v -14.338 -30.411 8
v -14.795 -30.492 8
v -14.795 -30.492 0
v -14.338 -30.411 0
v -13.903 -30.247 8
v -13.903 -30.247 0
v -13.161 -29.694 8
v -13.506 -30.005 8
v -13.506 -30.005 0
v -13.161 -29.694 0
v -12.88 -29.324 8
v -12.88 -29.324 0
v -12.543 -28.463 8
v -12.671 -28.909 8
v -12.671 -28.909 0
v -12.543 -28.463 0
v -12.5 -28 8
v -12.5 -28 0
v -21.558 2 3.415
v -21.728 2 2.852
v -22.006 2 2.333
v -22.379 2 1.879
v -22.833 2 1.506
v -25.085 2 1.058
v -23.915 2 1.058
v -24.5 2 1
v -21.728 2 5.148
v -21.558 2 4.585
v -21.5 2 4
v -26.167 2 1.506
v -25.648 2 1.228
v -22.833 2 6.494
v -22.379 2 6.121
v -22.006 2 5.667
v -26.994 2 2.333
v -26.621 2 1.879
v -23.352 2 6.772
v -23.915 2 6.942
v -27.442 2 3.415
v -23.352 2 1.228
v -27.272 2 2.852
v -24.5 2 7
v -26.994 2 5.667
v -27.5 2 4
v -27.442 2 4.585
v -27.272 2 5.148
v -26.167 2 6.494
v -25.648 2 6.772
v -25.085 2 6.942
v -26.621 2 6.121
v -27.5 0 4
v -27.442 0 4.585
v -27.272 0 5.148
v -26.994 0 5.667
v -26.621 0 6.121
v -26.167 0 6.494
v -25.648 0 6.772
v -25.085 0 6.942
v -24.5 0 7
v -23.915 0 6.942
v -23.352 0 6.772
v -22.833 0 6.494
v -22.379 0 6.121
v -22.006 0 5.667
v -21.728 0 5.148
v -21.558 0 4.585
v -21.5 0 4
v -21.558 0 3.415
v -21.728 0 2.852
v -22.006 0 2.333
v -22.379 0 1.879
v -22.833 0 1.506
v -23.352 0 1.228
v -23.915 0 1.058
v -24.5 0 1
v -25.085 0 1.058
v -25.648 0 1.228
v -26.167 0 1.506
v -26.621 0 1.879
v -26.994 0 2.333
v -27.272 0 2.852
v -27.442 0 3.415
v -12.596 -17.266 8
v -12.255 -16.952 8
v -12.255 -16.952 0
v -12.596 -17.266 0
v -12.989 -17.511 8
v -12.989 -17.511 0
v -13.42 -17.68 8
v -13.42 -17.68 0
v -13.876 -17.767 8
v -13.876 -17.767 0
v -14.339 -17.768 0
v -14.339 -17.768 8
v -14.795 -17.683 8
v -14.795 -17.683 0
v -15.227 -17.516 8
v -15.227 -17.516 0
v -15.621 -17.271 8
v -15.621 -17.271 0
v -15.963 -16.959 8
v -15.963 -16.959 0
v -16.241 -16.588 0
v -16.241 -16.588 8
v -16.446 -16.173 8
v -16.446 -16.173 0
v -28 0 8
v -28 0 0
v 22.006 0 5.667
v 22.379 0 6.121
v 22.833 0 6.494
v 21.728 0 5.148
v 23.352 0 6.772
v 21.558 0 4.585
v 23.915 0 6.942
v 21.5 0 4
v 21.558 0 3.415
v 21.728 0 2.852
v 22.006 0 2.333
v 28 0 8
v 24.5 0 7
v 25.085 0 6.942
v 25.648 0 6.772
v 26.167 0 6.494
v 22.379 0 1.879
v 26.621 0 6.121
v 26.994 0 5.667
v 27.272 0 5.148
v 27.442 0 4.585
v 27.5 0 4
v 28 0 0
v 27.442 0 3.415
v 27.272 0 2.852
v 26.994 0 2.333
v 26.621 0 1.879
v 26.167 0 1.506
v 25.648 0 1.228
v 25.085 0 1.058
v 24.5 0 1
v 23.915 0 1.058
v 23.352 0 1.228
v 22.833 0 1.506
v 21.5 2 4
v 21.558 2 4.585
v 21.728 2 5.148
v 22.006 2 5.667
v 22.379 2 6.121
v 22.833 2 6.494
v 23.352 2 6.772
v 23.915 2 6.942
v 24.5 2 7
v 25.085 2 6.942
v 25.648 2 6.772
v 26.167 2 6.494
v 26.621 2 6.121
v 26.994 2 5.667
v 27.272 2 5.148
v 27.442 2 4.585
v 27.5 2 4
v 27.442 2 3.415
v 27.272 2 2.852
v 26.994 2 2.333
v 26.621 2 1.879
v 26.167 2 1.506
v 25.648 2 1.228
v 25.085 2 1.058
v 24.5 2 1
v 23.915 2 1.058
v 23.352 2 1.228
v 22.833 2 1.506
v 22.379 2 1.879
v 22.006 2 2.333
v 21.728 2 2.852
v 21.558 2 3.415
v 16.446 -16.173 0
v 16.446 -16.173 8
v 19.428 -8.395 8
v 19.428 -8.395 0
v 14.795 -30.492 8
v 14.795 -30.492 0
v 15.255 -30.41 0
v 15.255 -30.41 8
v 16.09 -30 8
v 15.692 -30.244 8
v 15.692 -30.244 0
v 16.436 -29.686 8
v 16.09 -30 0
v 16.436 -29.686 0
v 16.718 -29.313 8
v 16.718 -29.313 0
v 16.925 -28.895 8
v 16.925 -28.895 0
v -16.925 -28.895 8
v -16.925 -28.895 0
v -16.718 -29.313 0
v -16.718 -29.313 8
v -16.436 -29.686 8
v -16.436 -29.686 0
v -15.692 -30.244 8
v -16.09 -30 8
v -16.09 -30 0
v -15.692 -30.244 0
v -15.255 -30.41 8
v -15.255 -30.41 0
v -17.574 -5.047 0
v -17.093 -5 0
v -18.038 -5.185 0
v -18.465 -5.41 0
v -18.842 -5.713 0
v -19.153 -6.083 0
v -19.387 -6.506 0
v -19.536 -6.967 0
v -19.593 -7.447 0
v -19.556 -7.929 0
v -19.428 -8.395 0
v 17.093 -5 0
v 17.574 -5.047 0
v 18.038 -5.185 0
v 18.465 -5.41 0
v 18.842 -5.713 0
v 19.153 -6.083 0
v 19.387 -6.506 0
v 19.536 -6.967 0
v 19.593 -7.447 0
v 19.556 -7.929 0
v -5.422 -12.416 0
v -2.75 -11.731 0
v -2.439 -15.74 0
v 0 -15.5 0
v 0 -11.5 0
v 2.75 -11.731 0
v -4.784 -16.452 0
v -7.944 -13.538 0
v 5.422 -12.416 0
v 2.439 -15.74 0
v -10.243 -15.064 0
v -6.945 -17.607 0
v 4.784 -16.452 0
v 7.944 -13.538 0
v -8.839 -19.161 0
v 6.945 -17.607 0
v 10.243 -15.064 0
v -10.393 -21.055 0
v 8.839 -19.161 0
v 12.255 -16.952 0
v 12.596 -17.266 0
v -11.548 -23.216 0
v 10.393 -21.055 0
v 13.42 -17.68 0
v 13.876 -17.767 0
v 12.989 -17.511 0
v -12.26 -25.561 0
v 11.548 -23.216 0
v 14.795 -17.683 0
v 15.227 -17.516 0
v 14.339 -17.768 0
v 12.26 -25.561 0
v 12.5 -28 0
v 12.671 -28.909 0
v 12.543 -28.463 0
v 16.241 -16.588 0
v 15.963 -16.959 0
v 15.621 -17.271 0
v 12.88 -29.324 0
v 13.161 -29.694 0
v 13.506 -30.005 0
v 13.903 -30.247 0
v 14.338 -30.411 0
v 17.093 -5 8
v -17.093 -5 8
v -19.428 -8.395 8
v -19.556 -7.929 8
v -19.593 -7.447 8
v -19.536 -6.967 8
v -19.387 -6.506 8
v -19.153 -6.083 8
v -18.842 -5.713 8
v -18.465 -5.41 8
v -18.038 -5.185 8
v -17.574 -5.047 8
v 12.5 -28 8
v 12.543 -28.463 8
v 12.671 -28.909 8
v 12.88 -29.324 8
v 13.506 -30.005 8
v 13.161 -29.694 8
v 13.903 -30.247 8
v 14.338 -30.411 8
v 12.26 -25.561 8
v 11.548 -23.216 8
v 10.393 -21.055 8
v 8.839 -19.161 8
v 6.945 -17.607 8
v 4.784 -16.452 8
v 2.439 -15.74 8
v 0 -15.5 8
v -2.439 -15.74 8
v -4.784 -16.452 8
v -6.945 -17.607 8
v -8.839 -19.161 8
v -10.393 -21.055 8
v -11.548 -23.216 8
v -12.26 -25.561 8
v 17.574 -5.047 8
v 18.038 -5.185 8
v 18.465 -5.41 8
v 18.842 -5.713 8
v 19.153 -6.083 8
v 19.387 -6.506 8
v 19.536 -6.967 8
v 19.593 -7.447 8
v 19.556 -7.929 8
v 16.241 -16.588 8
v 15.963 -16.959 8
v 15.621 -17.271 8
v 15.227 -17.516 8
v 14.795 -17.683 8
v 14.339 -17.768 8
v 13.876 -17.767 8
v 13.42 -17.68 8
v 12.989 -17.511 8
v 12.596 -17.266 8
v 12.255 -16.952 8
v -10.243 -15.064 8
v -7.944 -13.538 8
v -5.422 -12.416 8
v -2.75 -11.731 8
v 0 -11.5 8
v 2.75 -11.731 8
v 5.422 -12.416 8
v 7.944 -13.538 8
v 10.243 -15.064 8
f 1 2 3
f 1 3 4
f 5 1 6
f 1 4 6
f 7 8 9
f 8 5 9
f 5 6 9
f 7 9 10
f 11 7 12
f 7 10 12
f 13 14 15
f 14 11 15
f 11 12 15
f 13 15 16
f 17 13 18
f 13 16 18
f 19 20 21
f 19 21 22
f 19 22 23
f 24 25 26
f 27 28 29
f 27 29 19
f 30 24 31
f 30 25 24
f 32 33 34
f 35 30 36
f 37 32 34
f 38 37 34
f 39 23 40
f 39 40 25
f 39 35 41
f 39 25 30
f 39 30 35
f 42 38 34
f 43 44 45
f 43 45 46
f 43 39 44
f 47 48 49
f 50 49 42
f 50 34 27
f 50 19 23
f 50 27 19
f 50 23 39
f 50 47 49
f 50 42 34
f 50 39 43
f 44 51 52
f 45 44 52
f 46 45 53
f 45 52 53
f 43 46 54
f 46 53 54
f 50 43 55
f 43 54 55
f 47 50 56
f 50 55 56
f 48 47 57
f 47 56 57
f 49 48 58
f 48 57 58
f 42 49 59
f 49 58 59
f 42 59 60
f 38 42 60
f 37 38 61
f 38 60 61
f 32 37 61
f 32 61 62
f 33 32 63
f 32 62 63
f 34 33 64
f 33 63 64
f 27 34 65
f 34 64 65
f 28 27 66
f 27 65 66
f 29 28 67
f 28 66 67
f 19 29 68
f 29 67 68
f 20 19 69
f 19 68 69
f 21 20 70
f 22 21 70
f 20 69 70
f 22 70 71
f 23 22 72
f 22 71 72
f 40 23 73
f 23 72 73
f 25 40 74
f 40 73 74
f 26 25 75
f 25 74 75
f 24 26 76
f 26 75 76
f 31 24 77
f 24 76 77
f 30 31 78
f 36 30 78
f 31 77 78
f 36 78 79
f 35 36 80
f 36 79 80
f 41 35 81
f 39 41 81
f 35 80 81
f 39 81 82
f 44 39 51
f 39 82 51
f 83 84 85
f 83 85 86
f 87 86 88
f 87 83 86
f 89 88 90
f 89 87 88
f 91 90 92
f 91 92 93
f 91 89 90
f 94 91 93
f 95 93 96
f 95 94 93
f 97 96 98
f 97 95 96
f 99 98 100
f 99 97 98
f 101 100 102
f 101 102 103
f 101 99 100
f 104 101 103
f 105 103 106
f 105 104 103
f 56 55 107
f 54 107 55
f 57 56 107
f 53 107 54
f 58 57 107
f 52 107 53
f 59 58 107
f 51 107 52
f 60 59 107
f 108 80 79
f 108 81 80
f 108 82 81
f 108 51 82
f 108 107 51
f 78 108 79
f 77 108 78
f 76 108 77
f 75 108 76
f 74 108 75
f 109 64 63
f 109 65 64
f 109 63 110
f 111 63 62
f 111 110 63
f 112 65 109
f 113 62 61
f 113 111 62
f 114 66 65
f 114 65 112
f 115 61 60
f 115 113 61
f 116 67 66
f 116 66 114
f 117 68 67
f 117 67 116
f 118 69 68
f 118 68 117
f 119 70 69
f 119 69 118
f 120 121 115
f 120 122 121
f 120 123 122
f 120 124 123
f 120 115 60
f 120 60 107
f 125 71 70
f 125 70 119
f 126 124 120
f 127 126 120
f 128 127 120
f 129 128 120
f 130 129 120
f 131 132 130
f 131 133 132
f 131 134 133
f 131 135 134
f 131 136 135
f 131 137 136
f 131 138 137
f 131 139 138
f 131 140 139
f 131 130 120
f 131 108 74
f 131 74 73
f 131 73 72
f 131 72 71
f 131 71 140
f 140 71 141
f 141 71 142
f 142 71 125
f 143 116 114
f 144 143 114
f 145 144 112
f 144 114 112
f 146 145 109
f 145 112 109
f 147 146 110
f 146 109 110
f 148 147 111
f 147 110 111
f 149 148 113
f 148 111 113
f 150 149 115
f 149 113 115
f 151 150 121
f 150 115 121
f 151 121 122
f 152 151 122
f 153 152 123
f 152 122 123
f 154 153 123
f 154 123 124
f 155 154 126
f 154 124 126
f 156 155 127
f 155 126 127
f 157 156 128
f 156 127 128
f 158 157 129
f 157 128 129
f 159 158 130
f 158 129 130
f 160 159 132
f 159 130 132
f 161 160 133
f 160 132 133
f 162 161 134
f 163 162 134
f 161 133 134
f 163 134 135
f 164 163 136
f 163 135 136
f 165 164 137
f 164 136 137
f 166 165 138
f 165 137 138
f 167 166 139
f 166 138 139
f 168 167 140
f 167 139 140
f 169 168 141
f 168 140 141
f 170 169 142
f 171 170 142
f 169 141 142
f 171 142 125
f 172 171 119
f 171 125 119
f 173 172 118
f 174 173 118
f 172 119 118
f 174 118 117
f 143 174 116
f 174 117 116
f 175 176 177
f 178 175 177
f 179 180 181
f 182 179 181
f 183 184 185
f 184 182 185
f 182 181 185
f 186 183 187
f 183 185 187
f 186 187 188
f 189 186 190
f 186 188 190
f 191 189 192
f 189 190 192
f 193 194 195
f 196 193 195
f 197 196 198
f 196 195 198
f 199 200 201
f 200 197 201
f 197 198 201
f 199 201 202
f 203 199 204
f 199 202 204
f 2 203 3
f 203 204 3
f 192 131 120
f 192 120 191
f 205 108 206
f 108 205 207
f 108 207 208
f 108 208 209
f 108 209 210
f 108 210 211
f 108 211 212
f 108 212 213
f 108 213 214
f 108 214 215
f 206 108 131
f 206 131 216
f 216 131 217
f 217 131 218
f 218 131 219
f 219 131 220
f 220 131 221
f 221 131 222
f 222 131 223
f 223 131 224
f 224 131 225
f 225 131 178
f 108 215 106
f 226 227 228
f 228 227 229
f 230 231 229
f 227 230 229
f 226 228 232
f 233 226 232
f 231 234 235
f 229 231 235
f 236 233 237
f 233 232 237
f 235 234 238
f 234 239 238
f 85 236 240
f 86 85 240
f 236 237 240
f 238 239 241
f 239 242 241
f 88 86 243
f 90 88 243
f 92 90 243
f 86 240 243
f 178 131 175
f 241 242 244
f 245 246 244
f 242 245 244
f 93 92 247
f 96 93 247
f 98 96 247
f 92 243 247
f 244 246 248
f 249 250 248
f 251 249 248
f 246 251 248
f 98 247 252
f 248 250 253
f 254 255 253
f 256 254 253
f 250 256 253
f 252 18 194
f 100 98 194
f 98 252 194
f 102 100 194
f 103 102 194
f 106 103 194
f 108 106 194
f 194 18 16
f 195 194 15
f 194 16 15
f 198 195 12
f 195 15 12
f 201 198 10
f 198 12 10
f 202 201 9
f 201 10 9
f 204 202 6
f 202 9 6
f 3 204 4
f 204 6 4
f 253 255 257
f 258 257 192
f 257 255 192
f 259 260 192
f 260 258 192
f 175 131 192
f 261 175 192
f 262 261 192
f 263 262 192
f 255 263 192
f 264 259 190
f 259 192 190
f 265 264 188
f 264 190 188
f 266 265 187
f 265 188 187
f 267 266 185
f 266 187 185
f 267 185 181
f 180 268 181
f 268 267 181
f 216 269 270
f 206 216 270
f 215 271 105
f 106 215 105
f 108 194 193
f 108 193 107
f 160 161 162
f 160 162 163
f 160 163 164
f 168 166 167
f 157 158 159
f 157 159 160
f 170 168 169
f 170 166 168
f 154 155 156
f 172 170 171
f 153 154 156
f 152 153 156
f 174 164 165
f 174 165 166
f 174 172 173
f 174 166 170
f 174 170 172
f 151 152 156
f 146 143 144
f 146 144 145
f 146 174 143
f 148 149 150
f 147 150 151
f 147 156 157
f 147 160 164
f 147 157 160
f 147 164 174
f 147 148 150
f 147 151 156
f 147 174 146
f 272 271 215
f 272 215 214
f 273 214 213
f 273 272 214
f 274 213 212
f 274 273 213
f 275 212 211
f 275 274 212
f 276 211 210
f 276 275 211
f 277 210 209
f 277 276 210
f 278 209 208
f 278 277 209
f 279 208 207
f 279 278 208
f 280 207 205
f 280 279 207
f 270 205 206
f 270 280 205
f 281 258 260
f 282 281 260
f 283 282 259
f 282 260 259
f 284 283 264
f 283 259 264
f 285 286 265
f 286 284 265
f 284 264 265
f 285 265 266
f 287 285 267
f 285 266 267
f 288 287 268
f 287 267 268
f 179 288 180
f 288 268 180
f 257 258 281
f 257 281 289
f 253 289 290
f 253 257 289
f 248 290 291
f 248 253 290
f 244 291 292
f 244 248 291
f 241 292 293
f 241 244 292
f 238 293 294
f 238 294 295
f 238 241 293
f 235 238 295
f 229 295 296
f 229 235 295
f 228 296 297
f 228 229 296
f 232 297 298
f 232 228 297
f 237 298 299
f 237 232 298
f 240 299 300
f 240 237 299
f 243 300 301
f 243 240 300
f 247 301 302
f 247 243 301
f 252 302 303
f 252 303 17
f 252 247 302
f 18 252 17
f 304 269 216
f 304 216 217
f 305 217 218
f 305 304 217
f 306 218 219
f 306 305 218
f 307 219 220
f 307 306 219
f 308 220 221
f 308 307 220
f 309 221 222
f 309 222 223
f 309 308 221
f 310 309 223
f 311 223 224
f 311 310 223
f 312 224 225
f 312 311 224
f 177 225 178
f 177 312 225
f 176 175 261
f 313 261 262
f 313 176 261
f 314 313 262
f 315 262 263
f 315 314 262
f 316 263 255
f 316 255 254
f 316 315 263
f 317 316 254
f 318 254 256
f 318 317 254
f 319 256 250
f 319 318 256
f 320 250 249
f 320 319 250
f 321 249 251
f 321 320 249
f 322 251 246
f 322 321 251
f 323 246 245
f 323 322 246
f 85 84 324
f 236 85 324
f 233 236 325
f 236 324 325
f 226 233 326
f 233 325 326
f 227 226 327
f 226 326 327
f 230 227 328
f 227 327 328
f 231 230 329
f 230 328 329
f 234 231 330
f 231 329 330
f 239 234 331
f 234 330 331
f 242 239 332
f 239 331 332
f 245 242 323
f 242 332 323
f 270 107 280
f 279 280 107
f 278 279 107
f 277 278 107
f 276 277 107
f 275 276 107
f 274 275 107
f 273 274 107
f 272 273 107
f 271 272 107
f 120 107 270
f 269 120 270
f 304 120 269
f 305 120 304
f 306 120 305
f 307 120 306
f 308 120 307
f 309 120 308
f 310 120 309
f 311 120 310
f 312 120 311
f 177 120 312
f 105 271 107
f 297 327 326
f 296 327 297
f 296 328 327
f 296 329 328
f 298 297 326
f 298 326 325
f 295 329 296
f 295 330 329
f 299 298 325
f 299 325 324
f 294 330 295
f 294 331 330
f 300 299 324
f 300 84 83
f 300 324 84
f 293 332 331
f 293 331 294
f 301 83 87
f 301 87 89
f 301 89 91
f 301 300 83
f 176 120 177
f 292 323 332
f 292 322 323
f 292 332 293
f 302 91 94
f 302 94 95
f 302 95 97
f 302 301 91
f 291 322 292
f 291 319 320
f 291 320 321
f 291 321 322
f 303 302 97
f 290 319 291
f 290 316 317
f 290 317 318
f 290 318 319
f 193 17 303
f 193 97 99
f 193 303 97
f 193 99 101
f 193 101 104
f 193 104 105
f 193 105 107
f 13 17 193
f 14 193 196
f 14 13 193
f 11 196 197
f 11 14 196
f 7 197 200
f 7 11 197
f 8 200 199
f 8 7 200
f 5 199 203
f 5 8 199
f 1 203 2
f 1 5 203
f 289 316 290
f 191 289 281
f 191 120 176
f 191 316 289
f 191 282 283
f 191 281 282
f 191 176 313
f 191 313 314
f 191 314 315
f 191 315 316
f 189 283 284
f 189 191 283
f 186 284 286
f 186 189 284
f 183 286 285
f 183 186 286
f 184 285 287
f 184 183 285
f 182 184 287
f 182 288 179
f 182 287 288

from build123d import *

# Parameters (mm, degrees)
BOSS_EXTRUDE1_DEPTH = 8
CUT_EXTRUDE1_DEPTH  = 43.16930163
FILLET1_R           = 2.5
SKETCH3_R           = 3
BOSS_EXTRUDE2_DEPTH = 2


with BuildPart() as part:
    # Sketch1 → Boss-Extrude1 (new body)
    with BuildSketch(Plane.XY):
        with BuildLine():
            Line((-28, 0), (28, 0))
            Line((28, 0), (16.30950643, -30.5))
            Line((16.30950643, -30.5), (12.247448714, -30.5))
            ThreePointArc((12.247448714, -30.5), (0, -15.5), (-12.247448714, -30.5))
            Line((-12.247448714, -30.5), (-16.30950643, -30.5))
            Line((-16.30950643, -30.5), (-28, 0))
        make_face()
    extrude(amount=BOSS_EXTRUDE1_DEPTH)

    # Sketch2 → Cut-Extrude1 (cut, through all)
    with BuildSketch(Plane.XY.offset(8)):
        with BuildLine():
            Line((-20.728819868, -5), (-14.748606624, -20.602121746))
            ThreePointArc((-14.748606624, -20.602121746), (0, -11.5), (14.748606624, -20.602121746))
            Line((14.748606624, -20.602121746), (20.728819868, -5))
            Line((20.728819868, -5), (-20.728819868, -5))
        make_face()
    extrude(amount=-CUT_EXTRUDE1_DEPTH, mode=Mode.SUBTRACT)

    # Fillet1
    # the kernel refuses this fillet: 2.5 mm, written as the material it adds along each edge
    with BuildSketch(Plane(origin=(14.748606624, -20.602121746, 8), x_dir=(0.35790469832996064, 0.9337581201324783, 0), z_dir=(0, 0, -1))) as fillet1_piece_1:
        with BuildLine():
            CenterArc((4.743679492, -2.5), FILLET1_R, 90, 116.993489573)
            ThreePointArc((2.516034231, -3.634723133), (1.38029262, -1.732719809), (0, 0))
            Line((0, 0), (4.743679492, 0))
        make_face()
    extrude(amount=8)
    with BuildSketch(Plane(origin=(20.728819868, -5, 8), x_dir=(-0.35790469832996097, -0.9337581201324782, 0), z_dir=(0, 0, -1))) as fillet1_piece_2:
        with BuildLine():
            CenterArc((FILLET1_R * 1.4542360265, FILLET1_R), FILLET1_R, 159.028427988, 110.971572012)
            Line((FILLET1_R * 0.520477906364, FILLET1_R * 1.35790469833), (0, 0))
            Line((0, 0), (FILLET1_R * 1.4542360265, 0))
        make_face()
    extrude(amount=8)
    with BuildSketch(Plane(origin=(-20.728819868, -5, 8), x_dir=(0.35790469832996097, -0.9337581201324782, 0), z_dir=(0, 0, -1))) as fillet1_piece_3:
        with BuildLine():
            CenterArc((FILLET1_R * 1.4542360265, -FILLET1_R), FILLET1_R, 90, 110.971572012)
            Line((FILLET1_R * 0.520477906364, -FILLET1_R * 1.35790469833), (0, 0))
            Line((0, 0), (FILLET1_R * 1.4542360265, 0))
        make_face()
    extrude(amount=8)
    with BuildSketch(Plane(origin=(-14.748606624, -20.602121746, 8), x_dir=(0.5640537125230959, 0.8257380997561593, 0), z_dir=(0, 0, -1))) as fillet1_piece_4:
        with BuildLine():
            CenterArc((4.755486169, -2.477467743), FILLET1_R, 97.698333221, 116.993489574)
            Line((2.69992297, -3.900373197), (0, 0))
            ThreePointArc((0, 0), (2.210296389, -0.148712899), (4.420592777, 0))
        make_face()
    extrude(amount=8)
    # the kernel refuses this fillet: 2.5 mm, written as the material it takes off along each edge
    with BuildSketch(Plane(origin=(12.247448714, -30.5, -6.881378215), x_dir=(1, 0, 0), z_dir=(0, 0, 1))) as fillet1_2_piece_1:
        with BuildLine():
            CenterArc((2.752551286, 2.5), FILLET1_R, 180, 90)
            ThreePointArc((0.252551286, 2.5), (0.189253199, 1.243637975), (0, 0))
            Line((0, 0), (2.752551286, 0))
        make_face()
    extrude(amount=21.76275643, mode=Mode.SUBTRACT)
    with BuildSketch(Plane(origin=(16.30950643, -30.5, -4.297789276), x_dir=(0.3579046983299623, 0.9337581201324777, 0), z_dir=(0, 0, 1))) as fillet1_2_piece_2:
        with BuildLine():
            CenterArc((FILLET1_R * 0.687646284221, FILLET1_R), FILLET1_R, 200.971572012, 69.028427988)
            Line((-FILLET1_R * 0.246111835912, FILLET1_R * 0.64209530167), (0, 0))
            Line((0, 0), (FILLET1_R * 0.687646284221, 0))
        make_face()
    extrude(amount=16.595578553, mode=Mode.SUBTRACT)
    with BuildSketch(Plane(origin=(-12.247448714, -30.5, -6.881378215), x_dir=(-1, 0, 0), z_dir=(0, 0, 1))) as fillet1_2_piece_3:
        with BuildLine():
            CenterArc((2.752551286, -2.5), FILLET1_R, 90, 90)
            ThreePointArc((0.252551286, -2.5), (0.189253199, -1.243637975), (0, 0))
            Line((0, 0), (2.752551286, 0))
        make_face()
    extrude(amount=21.76275643, mode=Mode.SUBTRACT)
    with BuildSketch(Plane(origin=(-16.30950643, -30.5, -4.297789276), x_dir=(-0.3579046983299605, 0.9337581201324784, 0), z_dir=(0, 0, 1))) as fillet1_2_piece_4:
        with BuildLine():
            CenterArc((FILLET1_R * 0.687646284221, -FILLET1_R), FILLET1_R, 90, 69.028427988)
            Line((-FILLET1_R * 0.246111835912, -FILLET1_R * 0.64209530167), (0, 0))
            Line((0, 0), (FILLET1_R * 0.687646284221, 0))
        make_face()
    extrude(amount=16.595578553, mode=Mode.SUBTRACT)

    # Sketch3 → Boss-Extrude2 (add)
    with BuildSketch(Plane(origin=(0, 0, 0), x_dir=(1, 0, 0), z_dir=(0, 1, 0))):
        with Locations(Location((-24.5, -4, 0), (0, 0, 180))):
            Circle(SKETCH3_R)
        with Locations(Location((24.5, -4, 0), (0, 0, 180))):
            Circle(SKETCH3_R)
    extrude(amount=BOSS_EXTRUDE2_DEPTH)


solid = part.part
